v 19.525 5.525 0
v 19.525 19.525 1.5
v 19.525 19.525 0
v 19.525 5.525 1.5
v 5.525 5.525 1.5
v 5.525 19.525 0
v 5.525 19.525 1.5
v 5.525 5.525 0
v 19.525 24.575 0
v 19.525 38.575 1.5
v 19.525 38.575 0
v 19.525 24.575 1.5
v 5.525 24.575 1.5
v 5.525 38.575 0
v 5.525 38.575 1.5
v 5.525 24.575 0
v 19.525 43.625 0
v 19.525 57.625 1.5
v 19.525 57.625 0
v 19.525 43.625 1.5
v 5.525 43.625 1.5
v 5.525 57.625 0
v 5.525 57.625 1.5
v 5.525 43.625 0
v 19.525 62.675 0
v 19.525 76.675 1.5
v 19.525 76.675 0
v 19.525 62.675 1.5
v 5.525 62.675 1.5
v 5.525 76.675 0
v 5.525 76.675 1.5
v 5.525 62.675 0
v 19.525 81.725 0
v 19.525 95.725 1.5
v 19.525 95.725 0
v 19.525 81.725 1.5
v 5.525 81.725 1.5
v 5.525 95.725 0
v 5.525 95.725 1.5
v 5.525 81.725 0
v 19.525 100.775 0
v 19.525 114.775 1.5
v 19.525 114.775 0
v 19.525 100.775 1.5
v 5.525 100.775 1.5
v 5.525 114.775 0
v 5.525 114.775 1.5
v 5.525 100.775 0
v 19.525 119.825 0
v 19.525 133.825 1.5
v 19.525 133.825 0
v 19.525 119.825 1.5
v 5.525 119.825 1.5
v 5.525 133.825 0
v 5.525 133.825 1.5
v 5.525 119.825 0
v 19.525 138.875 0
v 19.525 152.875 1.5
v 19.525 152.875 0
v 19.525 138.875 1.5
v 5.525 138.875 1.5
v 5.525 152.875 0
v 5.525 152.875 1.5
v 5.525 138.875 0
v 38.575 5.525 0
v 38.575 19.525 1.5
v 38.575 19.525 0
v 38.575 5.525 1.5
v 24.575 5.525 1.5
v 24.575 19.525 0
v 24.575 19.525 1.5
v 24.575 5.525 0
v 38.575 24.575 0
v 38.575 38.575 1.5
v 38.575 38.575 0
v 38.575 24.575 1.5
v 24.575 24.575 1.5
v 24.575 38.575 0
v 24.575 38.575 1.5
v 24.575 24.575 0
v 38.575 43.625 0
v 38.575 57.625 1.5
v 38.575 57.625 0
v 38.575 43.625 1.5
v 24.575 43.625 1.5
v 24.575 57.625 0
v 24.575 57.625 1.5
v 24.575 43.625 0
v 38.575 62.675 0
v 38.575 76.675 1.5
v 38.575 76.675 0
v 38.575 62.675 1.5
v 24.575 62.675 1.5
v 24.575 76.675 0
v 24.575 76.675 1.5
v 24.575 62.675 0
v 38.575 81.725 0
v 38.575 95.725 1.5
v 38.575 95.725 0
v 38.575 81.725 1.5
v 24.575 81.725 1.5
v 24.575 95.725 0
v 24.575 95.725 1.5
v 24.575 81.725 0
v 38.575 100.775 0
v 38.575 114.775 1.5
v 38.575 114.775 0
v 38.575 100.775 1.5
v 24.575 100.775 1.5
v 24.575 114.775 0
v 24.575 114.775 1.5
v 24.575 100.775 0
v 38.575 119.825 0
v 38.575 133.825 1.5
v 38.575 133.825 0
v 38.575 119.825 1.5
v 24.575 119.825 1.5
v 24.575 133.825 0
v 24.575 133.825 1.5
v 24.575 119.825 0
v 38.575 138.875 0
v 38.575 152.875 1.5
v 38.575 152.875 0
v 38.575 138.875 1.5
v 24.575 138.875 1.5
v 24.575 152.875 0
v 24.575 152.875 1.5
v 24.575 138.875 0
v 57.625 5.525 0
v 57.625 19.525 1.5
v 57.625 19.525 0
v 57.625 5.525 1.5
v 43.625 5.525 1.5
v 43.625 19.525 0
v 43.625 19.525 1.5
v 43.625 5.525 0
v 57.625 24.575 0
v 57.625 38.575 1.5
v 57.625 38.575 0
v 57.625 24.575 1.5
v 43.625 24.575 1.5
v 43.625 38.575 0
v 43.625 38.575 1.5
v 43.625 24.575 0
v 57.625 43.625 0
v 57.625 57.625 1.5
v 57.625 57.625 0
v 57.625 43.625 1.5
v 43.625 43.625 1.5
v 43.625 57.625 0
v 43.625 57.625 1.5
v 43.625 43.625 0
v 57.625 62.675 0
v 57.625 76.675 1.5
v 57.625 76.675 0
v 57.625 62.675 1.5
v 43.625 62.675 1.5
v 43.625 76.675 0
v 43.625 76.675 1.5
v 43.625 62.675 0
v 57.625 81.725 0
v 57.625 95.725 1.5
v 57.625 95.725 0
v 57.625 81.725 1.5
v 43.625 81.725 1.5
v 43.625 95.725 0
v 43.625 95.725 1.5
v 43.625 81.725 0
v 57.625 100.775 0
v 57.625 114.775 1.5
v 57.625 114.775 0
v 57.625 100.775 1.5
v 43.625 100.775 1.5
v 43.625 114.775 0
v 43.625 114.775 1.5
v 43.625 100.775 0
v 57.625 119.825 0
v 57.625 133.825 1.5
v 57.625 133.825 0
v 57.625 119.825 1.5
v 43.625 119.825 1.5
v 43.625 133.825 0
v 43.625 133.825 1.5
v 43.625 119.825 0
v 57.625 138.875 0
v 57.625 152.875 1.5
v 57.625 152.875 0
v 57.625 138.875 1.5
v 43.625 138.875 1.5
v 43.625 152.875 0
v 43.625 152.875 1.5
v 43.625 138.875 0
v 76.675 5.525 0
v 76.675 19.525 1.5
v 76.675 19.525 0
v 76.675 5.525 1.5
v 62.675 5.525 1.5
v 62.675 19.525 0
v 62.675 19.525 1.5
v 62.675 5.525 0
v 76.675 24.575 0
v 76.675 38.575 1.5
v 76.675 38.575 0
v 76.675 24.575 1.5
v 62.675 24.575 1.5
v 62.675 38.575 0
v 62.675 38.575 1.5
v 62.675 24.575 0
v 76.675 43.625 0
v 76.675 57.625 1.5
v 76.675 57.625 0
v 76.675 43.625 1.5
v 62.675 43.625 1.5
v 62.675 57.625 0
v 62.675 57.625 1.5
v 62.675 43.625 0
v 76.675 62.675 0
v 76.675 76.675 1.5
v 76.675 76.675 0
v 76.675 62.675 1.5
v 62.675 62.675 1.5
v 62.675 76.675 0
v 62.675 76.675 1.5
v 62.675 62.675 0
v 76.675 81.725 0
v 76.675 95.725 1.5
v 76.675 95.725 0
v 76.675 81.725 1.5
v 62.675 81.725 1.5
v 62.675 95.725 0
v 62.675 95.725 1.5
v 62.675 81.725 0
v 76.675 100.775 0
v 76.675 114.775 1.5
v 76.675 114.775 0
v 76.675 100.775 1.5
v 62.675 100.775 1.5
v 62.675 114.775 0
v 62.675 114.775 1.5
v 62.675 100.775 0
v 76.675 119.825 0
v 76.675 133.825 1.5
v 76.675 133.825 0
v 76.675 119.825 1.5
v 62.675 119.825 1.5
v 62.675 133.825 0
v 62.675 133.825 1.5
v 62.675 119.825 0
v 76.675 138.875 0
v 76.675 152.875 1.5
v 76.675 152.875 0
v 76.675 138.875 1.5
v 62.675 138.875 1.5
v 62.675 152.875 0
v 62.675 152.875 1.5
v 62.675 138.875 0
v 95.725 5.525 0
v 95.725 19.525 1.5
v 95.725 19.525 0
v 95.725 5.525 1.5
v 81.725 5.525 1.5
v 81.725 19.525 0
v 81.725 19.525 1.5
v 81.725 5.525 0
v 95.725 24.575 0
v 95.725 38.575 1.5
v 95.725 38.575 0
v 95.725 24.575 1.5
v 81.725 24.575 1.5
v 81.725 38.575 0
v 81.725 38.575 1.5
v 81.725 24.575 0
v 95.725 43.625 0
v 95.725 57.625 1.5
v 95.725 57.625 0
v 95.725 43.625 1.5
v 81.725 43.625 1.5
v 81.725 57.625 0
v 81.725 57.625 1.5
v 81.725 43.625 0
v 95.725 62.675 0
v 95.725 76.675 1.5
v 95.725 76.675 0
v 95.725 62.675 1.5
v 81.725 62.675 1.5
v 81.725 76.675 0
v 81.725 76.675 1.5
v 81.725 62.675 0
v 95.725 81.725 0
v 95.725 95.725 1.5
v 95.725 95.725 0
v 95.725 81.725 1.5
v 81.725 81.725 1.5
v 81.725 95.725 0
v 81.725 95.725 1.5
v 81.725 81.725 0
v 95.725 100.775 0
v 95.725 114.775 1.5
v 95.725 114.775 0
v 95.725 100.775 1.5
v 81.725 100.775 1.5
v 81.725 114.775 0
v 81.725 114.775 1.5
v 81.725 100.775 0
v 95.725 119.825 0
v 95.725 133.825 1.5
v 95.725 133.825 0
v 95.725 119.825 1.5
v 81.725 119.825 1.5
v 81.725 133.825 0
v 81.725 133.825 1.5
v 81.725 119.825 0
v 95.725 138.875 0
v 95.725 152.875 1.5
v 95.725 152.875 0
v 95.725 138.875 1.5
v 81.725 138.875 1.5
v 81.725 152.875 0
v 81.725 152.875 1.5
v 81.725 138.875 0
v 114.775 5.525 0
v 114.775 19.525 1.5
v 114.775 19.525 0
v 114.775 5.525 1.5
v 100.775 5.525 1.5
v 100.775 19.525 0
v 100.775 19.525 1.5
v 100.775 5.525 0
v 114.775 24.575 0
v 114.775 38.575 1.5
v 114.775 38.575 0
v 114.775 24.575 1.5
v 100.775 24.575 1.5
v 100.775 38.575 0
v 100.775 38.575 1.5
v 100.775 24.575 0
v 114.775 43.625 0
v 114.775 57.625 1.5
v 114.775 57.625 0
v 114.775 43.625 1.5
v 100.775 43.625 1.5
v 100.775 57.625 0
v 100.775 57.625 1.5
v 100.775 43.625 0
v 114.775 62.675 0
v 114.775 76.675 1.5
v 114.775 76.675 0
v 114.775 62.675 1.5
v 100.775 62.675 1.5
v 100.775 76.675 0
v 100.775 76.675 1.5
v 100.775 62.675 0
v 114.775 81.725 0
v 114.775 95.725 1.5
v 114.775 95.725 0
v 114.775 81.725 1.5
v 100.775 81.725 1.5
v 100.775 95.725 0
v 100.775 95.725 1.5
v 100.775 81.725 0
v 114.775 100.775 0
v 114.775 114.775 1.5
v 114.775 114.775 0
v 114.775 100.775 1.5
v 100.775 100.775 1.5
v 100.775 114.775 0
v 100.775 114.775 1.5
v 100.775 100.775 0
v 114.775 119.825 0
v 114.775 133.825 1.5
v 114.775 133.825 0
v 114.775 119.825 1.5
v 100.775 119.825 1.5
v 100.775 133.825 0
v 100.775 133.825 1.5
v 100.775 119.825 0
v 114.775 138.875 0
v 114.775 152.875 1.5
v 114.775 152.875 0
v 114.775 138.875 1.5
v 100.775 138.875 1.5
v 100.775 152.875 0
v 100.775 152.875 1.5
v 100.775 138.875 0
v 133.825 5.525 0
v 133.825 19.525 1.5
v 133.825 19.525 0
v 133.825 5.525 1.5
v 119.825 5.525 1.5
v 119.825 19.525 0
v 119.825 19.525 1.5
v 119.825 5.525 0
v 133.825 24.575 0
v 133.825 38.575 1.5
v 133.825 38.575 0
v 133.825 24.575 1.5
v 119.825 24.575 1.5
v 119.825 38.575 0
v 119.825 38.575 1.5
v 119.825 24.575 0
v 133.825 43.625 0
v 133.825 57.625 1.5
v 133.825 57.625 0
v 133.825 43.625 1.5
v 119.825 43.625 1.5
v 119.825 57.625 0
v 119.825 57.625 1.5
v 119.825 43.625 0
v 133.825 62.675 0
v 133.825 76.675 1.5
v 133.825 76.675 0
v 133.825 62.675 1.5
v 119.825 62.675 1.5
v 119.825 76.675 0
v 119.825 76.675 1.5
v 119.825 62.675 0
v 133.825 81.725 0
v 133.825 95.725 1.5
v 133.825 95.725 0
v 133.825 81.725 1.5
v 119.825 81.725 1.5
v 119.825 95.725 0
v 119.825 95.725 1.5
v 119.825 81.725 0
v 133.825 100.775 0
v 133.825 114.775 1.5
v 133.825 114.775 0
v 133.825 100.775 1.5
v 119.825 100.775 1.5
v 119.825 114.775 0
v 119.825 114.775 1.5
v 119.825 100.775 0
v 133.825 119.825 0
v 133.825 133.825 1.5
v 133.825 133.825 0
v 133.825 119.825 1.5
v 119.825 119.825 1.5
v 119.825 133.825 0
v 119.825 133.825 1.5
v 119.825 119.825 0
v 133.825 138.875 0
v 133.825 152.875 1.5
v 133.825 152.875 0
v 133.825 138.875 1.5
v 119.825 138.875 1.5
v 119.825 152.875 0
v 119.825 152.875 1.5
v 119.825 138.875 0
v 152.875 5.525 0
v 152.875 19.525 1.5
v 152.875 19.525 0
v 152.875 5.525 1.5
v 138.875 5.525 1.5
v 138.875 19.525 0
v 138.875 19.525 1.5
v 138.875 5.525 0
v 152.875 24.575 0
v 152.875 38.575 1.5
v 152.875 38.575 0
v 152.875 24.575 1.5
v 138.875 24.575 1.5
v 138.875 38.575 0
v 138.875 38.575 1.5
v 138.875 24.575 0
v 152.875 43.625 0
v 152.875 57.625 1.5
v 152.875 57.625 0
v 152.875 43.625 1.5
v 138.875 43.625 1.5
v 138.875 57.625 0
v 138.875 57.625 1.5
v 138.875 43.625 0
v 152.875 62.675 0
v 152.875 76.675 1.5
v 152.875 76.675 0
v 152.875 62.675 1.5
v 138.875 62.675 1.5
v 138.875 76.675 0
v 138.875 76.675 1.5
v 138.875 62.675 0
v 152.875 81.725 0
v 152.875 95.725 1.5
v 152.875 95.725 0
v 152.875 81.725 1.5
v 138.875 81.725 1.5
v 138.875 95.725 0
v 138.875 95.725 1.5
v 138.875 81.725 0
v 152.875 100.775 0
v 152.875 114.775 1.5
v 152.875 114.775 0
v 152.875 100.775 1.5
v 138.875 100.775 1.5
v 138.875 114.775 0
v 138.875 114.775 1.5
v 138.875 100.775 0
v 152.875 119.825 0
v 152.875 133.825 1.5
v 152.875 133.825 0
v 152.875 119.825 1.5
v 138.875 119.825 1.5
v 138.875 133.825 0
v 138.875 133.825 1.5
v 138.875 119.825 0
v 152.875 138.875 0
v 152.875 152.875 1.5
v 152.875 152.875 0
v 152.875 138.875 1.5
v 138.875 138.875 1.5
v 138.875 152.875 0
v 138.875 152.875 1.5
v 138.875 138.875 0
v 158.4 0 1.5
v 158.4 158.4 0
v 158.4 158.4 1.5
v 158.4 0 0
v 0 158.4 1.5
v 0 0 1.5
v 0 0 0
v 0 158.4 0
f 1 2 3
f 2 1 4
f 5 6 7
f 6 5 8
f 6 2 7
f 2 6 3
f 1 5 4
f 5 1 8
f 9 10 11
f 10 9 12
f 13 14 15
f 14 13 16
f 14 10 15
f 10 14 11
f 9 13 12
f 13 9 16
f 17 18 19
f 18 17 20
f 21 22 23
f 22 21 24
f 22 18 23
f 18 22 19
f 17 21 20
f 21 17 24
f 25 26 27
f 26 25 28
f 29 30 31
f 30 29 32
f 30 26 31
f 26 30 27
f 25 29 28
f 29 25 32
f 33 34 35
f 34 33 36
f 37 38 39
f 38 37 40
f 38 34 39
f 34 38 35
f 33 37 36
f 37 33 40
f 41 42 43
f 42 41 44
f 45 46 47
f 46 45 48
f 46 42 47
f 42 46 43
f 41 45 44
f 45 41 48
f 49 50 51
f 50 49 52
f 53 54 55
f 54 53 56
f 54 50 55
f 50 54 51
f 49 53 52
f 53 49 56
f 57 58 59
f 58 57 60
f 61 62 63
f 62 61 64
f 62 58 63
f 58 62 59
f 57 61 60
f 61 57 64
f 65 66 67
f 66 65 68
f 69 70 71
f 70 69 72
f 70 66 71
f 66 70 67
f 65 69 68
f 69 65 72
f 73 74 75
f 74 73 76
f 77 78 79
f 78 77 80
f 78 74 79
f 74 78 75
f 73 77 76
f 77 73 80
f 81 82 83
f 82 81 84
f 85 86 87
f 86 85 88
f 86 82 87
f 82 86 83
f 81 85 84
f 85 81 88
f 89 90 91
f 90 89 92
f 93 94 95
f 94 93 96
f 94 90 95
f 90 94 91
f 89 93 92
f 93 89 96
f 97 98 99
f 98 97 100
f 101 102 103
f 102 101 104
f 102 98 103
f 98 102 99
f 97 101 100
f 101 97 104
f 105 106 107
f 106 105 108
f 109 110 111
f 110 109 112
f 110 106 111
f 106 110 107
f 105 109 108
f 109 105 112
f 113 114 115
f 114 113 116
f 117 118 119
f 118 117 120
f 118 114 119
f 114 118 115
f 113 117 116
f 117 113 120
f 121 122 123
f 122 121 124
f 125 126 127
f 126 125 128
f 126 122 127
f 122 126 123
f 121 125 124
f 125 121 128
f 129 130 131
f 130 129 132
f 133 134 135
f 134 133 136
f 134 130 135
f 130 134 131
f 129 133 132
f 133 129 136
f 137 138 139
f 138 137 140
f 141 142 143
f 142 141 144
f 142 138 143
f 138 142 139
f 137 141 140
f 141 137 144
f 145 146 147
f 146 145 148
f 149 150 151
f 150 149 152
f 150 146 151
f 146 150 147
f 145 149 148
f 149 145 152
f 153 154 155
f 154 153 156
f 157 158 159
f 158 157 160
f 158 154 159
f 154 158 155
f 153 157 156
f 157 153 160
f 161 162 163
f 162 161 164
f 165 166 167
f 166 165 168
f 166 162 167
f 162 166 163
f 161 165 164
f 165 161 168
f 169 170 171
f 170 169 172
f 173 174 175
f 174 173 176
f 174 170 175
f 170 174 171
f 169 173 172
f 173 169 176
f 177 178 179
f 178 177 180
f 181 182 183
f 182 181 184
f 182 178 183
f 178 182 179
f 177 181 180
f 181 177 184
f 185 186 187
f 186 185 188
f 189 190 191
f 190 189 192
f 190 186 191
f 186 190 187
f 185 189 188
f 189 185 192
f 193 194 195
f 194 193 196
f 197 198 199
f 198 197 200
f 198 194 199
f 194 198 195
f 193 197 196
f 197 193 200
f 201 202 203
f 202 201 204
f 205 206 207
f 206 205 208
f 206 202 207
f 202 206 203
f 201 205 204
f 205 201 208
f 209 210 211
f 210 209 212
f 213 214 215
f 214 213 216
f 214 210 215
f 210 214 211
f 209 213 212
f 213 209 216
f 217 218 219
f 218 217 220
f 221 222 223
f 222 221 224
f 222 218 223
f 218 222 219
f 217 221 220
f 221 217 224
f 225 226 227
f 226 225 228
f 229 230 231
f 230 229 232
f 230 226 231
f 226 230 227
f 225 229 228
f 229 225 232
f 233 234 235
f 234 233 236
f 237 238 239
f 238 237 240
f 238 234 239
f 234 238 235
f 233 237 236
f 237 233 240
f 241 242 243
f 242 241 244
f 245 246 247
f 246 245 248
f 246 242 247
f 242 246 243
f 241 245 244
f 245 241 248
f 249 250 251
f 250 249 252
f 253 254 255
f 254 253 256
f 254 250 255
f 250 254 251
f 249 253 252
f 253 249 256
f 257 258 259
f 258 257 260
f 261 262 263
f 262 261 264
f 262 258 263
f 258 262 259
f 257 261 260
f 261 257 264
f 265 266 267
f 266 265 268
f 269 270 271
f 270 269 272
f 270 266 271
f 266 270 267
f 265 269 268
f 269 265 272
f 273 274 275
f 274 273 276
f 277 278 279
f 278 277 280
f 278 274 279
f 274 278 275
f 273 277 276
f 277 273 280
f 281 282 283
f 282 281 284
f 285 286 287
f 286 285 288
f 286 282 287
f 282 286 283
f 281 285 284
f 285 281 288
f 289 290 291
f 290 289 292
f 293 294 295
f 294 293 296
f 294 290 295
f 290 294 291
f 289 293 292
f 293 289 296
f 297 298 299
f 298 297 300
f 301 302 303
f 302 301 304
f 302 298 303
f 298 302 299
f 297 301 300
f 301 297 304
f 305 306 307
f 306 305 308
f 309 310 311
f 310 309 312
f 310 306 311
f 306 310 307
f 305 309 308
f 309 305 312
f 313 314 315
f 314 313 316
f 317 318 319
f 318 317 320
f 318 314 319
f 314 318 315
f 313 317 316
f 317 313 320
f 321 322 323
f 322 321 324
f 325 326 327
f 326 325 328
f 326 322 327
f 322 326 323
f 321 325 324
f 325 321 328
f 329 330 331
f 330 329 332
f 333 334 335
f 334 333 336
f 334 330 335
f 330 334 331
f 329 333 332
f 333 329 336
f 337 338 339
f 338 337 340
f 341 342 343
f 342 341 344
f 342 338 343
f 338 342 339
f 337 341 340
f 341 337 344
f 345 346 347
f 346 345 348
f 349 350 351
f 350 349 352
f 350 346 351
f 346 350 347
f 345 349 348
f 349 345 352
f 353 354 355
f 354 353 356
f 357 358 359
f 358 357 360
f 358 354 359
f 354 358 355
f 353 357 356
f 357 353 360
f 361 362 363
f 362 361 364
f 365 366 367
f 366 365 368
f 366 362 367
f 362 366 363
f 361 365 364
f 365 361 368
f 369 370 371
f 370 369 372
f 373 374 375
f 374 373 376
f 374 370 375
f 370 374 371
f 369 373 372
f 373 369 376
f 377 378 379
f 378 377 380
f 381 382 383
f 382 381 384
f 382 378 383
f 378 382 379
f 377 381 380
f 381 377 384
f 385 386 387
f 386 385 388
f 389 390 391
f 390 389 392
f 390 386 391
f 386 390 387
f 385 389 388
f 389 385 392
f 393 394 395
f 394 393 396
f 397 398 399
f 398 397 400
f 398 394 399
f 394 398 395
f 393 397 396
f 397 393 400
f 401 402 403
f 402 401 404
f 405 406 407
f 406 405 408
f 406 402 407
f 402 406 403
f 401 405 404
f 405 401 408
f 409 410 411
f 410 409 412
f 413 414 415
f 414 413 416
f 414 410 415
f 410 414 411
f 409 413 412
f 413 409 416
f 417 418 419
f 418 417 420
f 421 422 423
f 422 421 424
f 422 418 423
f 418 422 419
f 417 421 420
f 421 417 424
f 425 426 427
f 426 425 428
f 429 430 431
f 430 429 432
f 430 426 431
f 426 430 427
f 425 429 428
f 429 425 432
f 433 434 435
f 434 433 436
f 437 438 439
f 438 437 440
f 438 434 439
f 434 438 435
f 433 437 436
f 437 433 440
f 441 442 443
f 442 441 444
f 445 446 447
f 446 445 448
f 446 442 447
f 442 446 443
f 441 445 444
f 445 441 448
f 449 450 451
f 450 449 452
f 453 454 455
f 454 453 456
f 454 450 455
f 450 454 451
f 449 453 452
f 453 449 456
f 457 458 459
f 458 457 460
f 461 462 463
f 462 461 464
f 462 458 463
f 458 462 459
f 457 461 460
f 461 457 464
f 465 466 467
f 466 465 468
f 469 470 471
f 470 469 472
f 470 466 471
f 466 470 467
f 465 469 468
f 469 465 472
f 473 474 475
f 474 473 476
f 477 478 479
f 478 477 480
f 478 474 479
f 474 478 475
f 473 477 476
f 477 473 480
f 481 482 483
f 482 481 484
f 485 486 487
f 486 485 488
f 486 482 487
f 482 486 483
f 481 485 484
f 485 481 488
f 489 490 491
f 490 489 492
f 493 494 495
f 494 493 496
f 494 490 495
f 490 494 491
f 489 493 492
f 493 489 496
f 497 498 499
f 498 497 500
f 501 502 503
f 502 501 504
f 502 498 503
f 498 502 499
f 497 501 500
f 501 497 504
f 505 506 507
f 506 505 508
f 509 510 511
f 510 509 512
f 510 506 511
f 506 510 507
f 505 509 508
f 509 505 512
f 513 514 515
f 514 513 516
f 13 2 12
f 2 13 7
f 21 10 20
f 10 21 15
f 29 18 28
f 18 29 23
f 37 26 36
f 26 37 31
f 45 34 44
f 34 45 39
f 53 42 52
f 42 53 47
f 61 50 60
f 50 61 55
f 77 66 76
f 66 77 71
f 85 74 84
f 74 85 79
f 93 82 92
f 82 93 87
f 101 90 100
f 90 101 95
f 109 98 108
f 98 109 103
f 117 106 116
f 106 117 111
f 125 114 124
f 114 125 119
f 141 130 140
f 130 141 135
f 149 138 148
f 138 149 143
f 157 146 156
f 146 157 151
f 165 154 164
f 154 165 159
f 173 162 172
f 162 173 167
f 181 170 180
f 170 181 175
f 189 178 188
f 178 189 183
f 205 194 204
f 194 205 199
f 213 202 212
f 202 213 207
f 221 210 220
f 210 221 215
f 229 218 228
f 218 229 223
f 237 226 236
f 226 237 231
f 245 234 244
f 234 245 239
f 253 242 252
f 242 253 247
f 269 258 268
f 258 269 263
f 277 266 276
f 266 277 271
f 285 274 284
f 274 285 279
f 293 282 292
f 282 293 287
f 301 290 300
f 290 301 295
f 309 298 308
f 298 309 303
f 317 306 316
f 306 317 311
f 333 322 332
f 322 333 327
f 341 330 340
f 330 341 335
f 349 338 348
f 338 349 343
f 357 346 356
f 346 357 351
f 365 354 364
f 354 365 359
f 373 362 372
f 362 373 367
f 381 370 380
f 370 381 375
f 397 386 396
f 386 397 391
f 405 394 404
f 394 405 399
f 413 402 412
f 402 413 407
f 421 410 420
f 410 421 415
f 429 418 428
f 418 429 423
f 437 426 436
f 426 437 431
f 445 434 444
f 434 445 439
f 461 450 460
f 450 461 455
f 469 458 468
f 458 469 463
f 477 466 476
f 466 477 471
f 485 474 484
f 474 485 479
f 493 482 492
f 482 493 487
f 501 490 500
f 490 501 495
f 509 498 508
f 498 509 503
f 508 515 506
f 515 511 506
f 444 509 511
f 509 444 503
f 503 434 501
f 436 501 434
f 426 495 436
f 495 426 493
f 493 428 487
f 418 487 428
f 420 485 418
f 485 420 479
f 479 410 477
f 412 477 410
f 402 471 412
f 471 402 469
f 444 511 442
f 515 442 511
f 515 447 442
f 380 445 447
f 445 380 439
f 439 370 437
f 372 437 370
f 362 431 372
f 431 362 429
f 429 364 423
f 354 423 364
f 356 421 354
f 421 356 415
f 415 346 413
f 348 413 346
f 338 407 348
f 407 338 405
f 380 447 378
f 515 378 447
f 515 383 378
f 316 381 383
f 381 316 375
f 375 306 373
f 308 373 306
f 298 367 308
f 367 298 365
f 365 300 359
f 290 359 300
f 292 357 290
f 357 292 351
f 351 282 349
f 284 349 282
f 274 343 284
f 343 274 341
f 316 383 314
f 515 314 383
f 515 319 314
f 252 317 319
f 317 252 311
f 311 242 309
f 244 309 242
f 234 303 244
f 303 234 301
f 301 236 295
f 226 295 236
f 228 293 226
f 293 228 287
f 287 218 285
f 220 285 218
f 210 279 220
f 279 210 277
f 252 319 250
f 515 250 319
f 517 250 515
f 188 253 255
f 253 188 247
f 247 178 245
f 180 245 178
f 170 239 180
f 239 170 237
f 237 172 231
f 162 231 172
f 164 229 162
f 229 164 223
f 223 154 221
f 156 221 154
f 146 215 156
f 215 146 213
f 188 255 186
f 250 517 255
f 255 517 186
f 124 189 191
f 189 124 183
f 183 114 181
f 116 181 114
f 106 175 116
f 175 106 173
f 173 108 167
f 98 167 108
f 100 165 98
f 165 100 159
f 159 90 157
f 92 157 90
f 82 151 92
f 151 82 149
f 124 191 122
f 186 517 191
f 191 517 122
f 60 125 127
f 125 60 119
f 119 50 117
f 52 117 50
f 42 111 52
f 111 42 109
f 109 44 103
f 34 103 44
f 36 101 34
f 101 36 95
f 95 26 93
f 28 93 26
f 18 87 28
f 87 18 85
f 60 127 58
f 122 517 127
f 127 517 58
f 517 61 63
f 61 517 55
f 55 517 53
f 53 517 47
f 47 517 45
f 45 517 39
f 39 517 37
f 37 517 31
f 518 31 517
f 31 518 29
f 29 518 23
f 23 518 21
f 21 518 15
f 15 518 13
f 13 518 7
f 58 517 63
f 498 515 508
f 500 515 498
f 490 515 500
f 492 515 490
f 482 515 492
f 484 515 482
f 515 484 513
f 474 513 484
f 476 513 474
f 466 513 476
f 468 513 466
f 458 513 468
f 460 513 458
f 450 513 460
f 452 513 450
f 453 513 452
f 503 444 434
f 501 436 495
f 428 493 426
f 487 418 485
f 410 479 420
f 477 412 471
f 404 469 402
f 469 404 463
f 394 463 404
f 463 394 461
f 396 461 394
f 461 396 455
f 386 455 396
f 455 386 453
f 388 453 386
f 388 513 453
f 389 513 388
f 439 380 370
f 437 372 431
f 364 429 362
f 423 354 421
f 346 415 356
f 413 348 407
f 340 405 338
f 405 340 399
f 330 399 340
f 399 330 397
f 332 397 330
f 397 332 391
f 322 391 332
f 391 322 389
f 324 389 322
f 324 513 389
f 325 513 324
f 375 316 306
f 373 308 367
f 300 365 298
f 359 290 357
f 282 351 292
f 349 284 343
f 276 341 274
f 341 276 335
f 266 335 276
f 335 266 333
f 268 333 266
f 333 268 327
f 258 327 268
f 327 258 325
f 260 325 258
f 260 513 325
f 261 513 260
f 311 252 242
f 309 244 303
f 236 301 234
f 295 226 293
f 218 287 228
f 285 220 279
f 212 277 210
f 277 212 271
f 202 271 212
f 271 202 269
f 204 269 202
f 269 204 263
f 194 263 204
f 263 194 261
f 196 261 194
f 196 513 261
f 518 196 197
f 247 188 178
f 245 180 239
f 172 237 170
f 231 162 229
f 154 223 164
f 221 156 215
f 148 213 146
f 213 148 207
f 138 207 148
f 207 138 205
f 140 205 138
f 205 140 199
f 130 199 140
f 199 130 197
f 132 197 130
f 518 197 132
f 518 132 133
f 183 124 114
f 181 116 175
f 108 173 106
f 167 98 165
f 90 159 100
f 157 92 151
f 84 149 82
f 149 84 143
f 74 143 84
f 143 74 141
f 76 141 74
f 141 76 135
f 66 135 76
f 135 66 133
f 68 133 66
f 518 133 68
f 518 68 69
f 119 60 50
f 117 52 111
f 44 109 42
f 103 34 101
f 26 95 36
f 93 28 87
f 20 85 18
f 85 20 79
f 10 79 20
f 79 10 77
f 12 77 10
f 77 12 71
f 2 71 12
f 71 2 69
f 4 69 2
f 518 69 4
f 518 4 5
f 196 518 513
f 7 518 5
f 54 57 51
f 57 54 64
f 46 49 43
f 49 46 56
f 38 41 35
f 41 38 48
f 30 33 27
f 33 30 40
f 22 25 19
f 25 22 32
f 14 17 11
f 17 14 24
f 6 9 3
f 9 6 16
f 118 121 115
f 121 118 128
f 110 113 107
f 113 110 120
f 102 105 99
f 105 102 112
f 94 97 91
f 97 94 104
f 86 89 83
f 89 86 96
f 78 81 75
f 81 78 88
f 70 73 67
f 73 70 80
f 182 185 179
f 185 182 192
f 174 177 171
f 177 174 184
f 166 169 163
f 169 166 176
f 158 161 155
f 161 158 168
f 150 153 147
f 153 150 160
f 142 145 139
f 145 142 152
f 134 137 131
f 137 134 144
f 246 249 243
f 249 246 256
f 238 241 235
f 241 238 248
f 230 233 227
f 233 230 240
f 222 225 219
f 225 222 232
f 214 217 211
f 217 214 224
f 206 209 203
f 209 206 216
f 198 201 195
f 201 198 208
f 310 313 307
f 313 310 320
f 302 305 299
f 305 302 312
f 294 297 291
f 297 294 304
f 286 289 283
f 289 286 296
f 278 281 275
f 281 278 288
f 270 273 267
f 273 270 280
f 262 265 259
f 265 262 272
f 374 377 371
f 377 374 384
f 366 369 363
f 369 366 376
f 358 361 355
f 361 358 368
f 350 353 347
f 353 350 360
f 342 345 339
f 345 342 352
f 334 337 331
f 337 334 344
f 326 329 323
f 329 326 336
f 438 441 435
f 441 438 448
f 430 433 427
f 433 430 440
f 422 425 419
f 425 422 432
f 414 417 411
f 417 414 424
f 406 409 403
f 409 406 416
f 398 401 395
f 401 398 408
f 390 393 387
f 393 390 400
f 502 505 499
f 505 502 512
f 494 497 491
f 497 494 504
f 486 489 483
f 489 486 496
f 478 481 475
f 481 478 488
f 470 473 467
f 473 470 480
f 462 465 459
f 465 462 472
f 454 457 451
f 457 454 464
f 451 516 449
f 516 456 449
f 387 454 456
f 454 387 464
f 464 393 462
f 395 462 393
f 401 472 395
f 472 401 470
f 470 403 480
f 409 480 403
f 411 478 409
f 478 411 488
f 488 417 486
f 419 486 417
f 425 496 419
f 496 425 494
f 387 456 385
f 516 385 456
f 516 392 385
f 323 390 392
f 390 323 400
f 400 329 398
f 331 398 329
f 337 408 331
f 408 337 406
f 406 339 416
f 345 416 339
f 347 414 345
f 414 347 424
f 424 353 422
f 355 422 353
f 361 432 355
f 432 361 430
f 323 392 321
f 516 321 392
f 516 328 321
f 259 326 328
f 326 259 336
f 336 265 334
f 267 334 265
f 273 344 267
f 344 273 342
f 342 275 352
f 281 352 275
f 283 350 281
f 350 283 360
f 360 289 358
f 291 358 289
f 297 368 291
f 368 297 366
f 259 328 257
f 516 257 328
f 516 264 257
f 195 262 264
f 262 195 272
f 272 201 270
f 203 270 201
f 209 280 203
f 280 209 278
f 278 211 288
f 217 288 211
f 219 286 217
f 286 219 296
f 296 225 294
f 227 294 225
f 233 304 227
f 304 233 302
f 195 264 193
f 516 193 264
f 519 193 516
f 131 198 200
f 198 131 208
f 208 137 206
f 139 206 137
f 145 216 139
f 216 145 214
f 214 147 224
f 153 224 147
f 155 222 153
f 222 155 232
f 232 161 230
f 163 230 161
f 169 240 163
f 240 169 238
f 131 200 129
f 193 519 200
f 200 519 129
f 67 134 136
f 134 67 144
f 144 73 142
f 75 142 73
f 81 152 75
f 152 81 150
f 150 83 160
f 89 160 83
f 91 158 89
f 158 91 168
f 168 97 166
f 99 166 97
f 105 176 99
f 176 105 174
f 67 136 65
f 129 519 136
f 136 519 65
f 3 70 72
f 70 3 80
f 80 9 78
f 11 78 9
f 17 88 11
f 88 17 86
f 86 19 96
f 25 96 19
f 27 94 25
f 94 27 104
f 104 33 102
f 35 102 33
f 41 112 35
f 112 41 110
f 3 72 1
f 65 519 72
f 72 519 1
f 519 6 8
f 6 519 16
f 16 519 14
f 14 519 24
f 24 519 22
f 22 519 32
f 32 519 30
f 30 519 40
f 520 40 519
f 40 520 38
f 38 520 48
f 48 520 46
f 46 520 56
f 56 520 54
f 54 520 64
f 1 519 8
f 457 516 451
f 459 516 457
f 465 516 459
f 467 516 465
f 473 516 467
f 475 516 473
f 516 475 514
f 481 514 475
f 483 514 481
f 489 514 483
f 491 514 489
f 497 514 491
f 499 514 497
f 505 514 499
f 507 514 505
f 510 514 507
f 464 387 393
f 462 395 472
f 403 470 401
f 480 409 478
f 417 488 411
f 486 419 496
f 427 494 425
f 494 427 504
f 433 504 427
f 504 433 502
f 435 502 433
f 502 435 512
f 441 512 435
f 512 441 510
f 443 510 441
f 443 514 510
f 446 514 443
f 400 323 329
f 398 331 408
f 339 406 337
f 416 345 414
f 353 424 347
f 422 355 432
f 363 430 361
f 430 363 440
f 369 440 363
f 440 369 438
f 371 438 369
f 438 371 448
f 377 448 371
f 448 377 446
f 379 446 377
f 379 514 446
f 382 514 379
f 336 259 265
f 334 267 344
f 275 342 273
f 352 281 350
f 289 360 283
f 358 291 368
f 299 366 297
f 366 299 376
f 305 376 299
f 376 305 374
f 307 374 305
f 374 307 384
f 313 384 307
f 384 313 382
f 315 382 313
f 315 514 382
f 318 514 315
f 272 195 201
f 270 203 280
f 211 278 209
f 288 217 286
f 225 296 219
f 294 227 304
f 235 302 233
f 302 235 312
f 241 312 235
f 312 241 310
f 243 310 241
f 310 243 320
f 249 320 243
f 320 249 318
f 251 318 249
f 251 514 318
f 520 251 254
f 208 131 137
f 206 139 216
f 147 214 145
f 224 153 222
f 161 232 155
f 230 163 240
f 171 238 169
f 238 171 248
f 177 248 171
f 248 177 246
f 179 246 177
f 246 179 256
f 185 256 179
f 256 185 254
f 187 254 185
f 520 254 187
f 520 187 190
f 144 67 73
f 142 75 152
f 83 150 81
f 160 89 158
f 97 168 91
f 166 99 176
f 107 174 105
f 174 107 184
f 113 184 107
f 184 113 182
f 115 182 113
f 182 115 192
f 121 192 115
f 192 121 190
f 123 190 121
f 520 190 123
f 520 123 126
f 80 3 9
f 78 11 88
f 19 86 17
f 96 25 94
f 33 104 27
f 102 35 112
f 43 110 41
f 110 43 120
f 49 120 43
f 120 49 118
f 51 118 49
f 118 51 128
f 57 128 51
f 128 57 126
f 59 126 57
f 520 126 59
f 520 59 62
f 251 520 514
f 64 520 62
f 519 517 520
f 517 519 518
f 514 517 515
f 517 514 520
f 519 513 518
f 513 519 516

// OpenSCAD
rows=8; cols=8; pitch=19.05; cut=14;
difference(){
  cube([cols*pitch+6, rows*pitch+6, 1.5]);
  for(i=[0:cols-1]) for(j=[0:rows-1])
    translate([3+i*pitch+(pitch-cut)/2, 3+j*pitch+(pitch-cut)/2, -1]) cube([cut,cut,4]);
}
